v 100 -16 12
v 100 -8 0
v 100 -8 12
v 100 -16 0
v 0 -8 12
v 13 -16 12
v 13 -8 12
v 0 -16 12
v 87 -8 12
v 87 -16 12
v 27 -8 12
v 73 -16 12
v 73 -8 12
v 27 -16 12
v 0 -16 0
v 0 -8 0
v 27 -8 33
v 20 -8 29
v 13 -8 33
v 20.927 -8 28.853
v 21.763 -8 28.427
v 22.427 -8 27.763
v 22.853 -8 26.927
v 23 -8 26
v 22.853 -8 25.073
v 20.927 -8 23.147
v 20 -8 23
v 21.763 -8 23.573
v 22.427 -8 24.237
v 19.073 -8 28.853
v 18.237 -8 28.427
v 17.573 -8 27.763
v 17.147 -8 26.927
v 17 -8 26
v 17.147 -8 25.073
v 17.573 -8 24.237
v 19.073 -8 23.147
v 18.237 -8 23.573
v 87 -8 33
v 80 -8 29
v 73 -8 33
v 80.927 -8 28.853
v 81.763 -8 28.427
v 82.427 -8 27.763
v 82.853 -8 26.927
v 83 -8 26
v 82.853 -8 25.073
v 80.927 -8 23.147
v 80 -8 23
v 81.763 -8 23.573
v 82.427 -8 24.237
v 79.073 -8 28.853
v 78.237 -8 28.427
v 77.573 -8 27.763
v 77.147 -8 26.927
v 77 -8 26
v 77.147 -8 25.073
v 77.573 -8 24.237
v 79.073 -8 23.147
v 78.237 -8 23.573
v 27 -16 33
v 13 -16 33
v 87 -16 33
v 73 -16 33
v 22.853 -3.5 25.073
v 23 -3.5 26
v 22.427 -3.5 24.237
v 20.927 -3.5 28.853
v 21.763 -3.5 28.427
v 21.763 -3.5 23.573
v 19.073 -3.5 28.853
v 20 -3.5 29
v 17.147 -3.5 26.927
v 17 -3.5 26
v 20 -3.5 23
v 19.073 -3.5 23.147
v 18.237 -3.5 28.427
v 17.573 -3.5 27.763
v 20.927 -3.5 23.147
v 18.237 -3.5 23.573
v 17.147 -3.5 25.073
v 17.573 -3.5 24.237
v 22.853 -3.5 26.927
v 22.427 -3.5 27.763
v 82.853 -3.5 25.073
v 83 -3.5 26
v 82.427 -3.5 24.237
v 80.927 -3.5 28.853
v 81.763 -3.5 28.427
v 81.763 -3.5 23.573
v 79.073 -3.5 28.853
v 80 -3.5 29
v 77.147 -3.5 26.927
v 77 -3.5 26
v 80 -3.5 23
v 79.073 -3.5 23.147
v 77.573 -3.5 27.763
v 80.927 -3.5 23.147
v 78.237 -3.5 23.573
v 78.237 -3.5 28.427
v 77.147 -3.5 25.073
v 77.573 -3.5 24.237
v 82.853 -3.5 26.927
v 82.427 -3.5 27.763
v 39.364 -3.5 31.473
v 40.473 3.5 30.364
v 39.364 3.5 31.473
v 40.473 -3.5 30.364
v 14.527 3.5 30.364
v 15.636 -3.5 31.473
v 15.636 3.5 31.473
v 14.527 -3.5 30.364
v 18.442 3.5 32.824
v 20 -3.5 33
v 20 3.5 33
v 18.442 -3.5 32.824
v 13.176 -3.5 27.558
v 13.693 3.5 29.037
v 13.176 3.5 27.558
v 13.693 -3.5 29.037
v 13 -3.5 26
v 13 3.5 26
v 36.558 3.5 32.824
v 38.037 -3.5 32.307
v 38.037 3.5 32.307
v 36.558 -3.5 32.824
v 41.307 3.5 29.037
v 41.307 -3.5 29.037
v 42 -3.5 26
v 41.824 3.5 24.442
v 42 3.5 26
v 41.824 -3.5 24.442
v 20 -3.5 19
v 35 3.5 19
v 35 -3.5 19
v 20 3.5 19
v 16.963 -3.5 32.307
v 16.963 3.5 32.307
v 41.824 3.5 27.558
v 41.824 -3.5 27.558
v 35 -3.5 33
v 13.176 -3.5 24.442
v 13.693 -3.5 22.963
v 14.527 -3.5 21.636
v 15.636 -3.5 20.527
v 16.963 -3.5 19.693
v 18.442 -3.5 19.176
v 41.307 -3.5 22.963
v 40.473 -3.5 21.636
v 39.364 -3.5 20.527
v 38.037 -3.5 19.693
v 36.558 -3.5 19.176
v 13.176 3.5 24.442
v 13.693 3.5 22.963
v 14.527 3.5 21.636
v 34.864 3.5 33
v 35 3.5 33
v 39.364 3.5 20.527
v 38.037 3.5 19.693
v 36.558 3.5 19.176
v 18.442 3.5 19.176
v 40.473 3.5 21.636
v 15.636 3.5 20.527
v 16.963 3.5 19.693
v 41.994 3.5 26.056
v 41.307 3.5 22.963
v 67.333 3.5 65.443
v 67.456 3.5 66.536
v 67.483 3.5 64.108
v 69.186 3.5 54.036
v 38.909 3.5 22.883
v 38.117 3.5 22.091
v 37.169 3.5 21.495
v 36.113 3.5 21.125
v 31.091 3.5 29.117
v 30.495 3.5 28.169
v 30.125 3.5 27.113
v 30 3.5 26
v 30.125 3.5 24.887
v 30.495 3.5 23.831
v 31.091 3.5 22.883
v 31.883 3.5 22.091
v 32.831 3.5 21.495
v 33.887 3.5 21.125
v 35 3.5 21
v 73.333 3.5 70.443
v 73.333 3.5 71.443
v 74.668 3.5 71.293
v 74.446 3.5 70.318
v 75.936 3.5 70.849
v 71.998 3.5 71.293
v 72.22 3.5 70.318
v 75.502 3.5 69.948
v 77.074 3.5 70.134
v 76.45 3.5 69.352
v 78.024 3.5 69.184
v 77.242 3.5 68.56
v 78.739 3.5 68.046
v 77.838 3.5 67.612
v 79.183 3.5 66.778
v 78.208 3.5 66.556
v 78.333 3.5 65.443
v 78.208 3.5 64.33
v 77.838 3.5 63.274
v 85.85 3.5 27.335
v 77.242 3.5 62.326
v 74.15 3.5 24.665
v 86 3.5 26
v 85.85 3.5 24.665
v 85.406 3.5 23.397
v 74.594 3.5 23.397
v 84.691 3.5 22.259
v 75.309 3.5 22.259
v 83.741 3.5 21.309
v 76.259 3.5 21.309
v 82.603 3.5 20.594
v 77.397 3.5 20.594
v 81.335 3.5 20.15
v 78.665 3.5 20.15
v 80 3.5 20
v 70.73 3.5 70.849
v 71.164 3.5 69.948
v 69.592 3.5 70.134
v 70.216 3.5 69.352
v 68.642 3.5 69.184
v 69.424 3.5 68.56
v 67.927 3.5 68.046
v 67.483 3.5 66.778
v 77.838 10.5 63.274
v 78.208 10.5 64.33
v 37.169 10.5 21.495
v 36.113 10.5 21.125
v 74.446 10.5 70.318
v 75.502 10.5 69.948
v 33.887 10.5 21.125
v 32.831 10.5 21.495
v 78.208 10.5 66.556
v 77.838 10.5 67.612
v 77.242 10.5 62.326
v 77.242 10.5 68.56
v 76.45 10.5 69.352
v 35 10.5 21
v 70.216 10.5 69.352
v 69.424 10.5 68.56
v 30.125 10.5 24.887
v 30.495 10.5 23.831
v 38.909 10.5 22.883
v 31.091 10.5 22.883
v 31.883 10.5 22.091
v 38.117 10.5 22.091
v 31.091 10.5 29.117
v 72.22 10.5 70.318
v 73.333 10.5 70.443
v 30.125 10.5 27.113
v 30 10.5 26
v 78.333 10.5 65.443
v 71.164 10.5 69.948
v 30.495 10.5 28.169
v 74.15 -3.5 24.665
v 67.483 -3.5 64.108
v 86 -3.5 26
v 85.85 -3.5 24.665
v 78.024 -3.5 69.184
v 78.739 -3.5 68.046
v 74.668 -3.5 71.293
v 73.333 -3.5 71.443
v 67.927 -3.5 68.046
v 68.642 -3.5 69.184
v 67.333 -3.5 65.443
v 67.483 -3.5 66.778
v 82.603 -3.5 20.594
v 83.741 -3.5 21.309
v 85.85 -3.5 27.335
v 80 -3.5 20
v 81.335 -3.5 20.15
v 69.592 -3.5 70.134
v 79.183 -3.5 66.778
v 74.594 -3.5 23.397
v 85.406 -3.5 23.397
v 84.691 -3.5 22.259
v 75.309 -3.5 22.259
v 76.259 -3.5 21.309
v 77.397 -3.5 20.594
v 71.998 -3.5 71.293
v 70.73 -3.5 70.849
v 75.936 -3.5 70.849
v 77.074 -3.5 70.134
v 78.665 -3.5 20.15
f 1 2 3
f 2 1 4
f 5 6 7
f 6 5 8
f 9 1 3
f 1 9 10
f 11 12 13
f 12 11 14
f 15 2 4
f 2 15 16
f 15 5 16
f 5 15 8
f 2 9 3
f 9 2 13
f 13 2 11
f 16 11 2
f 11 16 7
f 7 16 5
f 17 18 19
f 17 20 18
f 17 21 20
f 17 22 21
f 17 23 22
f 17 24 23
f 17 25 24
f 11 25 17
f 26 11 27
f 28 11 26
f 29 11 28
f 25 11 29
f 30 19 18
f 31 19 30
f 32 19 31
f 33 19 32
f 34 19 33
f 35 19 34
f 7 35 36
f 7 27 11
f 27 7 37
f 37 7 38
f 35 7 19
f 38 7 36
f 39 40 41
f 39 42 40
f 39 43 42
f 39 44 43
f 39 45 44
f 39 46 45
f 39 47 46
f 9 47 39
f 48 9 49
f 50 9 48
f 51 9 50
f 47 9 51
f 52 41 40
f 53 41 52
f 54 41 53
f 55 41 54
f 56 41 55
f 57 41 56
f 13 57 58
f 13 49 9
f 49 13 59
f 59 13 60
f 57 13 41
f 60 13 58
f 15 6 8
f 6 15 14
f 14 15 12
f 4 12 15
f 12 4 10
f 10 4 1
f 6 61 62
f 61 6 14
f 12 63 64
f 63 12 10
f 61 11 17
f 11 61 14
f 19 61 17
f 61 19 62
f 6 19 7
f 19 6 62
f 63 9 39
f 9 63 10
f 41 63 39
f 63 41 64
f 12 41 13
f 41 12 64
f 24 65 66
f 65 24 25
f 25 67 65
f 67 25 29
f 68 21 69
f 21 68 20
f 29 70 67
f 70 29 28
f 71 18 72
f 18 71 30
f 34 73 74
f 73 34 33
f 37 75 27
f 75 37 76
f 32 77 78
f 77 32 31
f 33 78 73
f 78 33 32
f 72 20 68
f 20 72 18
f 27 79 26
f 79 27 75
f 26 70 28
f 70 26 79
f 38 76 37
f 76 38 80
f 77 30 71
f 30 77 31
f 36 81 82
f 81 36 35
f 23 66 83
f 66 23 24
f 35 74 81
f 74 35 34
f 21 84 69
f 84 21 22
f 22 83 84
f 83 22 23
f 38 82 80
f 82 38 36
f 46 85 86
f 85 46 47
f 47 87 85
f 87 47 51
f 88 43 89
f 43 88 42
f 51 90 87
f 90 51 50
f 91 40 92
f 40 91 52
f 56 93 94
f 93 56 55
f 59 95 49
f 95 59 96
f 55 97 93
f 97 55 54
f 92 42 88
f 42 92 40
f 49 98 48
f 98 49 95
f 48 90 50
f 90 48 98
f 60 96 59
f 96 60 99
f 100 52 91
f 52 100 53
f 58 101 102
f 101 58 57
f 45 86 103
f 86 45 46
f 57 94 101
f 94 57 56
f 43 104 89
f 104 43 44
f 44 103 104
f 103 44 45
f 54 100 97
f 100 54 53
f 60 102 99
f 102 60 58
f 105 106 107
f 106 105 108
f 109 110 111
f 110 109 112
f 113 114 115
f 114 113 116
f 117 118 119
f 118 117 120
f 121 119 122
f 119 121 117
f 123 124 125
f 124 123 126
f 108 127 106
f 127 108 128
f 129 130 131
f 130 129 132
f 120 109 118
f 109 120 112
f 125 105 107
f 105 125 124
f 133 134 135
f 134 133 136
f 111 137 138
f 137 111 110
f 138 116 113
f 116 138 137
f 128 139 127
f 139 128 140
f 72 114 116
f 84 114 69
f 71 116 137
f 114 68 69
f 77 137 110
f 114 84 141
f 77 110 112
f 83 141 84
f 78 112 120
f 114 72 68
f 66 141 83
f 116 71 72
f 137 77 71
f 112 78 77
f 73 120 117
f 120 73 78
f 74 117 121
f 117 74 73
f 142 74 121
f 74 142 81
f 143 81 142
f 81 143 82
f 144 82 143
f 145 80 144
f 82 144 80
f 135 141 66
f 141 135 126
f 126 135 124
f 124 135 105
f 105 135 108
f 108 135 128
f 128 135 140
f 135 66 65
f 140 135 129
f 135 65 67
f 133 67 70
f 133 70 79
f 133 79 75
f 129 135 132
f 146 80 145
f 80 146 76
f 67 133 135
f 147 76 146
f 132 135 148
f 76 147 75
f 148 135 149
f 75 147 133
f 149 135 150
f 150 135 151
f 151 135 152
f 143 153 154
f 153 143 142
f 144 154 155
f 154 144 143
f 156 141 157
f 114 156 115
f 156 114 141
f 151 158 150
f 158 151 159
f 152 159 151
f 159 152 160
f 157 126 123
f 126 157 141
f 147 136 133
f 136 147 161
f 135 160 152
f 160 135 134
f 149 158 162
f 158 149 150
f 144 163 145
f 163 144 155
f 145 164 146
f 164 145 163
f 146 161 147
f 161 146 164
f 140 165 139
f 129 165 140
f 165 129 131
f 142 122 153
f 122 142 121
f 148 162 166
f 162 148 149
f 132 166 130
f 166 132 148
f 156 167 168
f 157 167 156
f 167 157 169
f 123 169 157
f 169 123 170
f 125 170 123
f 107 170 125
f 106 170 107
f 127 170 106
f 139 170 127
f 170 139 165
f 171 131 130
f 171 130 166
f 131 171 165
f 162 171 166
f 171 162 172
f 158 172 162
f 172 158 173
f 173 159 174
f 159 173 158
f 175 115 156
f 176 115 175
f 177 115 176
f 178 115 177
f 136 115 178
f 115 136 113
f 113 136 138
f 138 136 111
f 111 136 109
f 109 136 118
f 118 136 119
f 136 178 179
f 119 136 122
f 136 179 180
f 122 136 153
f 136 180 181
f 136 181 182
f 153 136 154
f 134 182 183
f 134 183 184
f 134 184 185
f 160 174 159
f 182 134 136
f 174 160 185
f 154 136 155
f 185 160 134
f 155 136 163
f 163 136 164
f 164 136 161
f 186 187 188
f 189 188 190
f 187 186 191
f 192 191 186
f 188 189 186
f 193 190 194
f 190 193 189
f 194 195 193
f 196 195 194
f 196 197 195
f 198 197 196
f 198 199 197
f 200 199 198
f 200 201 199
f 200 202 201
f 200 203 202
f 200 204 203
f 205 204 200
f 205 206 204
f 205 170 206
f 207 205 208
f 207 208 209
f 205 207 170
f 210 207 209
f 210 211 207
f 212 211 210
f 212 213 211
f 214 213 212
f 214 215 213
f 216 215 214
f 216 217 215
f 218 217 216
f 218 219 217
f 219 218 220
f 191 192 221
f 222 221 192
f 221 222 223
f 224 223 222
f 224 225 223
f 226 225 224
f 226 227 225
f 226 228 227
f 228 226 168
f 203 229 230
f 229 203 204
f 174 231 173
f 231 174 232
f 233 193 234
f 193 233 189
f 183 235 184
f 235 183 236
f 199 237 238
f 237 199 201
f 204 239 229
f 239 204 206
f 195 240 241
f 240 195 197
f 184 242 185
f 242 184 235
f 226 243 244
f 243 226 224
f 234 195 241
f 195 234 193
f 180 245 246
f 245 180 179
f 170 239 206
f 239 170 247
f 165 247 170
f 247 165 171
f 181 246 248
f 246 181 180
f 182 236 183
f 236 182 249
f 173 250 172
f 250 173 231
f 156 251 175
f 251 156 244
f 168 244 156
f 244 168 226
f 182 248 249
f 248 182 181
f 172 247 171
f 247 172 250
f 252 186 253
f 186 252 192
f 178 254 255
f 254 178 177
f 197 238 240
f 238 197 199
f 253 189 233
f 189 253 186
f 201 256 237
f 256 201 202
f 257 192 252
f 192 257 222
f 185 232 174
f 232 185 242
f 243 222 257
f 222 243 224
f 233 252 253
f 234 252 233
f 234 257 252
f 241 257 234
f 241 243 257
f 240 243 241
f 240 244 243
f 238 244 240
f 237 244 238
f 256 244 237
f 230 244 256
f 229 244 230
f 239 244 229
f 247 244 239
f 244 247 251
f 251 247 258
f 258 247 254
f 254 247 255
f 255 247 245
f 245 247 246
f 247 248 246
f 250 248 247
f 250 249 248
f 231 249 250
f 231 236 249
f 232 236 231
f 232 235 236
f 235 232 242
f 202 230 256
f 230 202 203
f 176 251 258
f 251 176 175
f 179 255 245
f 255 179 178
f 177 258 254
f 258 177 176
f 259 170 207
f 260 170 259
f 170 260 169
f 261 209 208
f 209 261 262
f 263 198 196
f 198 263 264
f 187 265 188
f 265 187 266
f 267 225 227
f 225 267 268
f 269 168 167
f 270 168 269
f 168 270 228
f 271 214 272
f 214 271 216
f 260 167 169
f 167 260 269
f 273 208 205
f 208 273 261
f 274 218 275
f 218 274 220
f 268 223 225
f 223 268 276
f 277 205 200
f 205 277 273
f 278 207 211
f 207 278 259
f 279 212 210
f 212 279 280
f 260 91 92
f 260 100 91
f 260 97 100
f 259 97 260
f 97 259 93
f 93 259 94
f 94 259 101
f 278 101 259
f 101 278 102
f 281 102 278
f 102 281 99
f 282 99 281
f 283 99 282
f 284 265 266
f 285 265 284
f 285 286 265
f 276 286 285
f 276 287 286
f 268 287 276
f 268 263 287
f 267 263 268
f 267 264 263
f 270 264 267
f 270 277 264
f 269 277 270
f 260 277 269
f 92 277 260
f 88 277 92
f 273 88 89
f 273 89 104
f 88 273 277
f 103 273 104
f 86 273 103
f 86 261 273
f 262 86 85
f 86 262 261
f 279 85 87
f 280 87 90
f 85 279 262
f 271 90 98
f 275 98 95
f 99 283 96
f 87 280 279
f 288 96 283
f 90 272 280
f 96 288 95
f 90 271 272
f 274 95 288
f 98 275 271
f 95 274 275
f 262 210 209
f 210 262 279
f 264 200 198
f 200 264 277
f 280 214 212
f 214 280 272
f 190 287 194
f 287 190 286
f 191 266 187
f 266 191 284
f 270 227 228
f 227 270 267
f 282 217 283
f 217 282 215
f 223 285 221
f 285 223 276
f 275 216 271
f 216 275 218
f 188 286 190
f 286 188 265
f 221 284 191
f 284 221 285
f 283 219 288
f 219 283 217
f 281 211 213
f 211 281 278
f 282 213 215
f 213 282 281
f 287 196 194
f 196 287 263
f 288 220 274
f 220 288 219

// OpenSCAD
// A four-bar crank-rocker: the linkage behind every windscreen wiper.
//
// Four hinges in a *closed* loop, which is the thing a chain of joints cannot
// do. The crank goes all the way round; the rocker cannot, and swings back and
// forth between two limits nobody wrote down. Where it turns round is decided
// by the four lengths, and by nothing else.
//
// Grashof's condition says which of the four can rotate fully: shortest plus
// longest must be no more than the other two. Here 15 + 60 = 75 against
// 55 + 40 = 95, and the shortest link is the one next to the ground, which
// makes it a crank-rocker rather than a drag-link or a double-rocker.
//
// The mobility count comes out negative. A planar loop counted in three
// dimensions always does — the count assumes the four hinge constraints are
// independent and, being parallel, they are not. It is over-constrained on
// paper and moves perfectly well.

module part(name, fixed = false, density = undef, mass = undef,
            collider = undef, friction = undef, bounce = undef) { children(); }
module hinge(name, parts, at, axis, range) { }
module drive(name, to, over, at, torque, speed) { }

STEEL = 0.0078;
PIN   = [0, 1, 0];        // every hinge turns about y, so the linkage is planar

// The four pin centres, in the plane the linkage works in.
A = [20,  0, 26];         // crank on ground
D = [80,  0, 26];         // rocker on ground        — ground link, 60
B = [35,  0, 26];         // crank to coupler        — crank,       15
C = [73.333, 0, 65.443];  // coupler to rocker       — coupler, 55; rocker, 40

// A link is the convex hull of its two bearings, which is both what one looks
// like and exactly what its collider will be.
module bar(p, q, r = 6, t = 7) {
    hull() {
        translate(p) rotate([-90, 0, 0]) cylinder(h = t, r = r, $fn = 28, center = true);
        translate(q) rotate([-90, 0, 0]) cylinder(h = t, r = r, $fn = 28, center = true);
    }
}

// The ground link is a real part like the others — it is the one that is fixed,
// which is all that makes it "the frame". Set behind the linkage in y so the
// bars swing past it.
//
// A hinge() holds the two ground bearings where they are; it does not put
// anything through them. So each post carries a pin, out of its face and
// through the eye of the bar it holds — thinner than the eye, and stopping
// inside it, short of the coupler in front.
PIN_R = 3;
module ground_pin(p) {
    translate([p[0], -8, p[2]]) rotate([-90, 0, 0]) cylinder(h = 11, r = PIN_R, $fn = 20);
}
part("frame", fixed = true)
    color("slategray") {
        translate([0, -16, 0]) {
            cube([100, 8, 12]);
            translate([A[0] - 7, 0, 0]) cube([14, 8, A[2] + 7]);
            translate([D[0] - 7, 0, 0]) cube([14, 8, D[2] + 7]);
        }
        color("dimgray") { ground_pin(A); ground_pin(D); }
    }

// The links in two layers, as a real one is built: the crank and the rocker
// behind, the coupler in front of both, lying against them at its two pins.
// All in one plane, the coupler's sweep crosses the crank's own pin — at 131°
// the crank stalls against it, however hard it is driven.
part("crank", density = STEEL)   color("indianred") bar(A, B, 7);
part("coupler", density = STEEL) color("goldenrod") translate([0, 7, 0]) bar(B, C, 5);
part("rocker", density = STEEL)  color("steelblue") bar(D, C, 6);

hinge("crank_pin",  parts = ["crank",   "frame"],   at = A, axis = PIN);
hinge("coupler_pin", parts = ["coupler", "crank"],  at = B, axis = PIN);
hinge("rocker_pin",  parts = ["rocker",  "coupler"], at = C, axis = PIN);
hinge("rocker_ground", parts = ["rocker", "frame"], at = D, axis = PIN);

// One input. Everything else follows from the geometry.
drive("crank_pin", speed = 150, torque = 30000000);
